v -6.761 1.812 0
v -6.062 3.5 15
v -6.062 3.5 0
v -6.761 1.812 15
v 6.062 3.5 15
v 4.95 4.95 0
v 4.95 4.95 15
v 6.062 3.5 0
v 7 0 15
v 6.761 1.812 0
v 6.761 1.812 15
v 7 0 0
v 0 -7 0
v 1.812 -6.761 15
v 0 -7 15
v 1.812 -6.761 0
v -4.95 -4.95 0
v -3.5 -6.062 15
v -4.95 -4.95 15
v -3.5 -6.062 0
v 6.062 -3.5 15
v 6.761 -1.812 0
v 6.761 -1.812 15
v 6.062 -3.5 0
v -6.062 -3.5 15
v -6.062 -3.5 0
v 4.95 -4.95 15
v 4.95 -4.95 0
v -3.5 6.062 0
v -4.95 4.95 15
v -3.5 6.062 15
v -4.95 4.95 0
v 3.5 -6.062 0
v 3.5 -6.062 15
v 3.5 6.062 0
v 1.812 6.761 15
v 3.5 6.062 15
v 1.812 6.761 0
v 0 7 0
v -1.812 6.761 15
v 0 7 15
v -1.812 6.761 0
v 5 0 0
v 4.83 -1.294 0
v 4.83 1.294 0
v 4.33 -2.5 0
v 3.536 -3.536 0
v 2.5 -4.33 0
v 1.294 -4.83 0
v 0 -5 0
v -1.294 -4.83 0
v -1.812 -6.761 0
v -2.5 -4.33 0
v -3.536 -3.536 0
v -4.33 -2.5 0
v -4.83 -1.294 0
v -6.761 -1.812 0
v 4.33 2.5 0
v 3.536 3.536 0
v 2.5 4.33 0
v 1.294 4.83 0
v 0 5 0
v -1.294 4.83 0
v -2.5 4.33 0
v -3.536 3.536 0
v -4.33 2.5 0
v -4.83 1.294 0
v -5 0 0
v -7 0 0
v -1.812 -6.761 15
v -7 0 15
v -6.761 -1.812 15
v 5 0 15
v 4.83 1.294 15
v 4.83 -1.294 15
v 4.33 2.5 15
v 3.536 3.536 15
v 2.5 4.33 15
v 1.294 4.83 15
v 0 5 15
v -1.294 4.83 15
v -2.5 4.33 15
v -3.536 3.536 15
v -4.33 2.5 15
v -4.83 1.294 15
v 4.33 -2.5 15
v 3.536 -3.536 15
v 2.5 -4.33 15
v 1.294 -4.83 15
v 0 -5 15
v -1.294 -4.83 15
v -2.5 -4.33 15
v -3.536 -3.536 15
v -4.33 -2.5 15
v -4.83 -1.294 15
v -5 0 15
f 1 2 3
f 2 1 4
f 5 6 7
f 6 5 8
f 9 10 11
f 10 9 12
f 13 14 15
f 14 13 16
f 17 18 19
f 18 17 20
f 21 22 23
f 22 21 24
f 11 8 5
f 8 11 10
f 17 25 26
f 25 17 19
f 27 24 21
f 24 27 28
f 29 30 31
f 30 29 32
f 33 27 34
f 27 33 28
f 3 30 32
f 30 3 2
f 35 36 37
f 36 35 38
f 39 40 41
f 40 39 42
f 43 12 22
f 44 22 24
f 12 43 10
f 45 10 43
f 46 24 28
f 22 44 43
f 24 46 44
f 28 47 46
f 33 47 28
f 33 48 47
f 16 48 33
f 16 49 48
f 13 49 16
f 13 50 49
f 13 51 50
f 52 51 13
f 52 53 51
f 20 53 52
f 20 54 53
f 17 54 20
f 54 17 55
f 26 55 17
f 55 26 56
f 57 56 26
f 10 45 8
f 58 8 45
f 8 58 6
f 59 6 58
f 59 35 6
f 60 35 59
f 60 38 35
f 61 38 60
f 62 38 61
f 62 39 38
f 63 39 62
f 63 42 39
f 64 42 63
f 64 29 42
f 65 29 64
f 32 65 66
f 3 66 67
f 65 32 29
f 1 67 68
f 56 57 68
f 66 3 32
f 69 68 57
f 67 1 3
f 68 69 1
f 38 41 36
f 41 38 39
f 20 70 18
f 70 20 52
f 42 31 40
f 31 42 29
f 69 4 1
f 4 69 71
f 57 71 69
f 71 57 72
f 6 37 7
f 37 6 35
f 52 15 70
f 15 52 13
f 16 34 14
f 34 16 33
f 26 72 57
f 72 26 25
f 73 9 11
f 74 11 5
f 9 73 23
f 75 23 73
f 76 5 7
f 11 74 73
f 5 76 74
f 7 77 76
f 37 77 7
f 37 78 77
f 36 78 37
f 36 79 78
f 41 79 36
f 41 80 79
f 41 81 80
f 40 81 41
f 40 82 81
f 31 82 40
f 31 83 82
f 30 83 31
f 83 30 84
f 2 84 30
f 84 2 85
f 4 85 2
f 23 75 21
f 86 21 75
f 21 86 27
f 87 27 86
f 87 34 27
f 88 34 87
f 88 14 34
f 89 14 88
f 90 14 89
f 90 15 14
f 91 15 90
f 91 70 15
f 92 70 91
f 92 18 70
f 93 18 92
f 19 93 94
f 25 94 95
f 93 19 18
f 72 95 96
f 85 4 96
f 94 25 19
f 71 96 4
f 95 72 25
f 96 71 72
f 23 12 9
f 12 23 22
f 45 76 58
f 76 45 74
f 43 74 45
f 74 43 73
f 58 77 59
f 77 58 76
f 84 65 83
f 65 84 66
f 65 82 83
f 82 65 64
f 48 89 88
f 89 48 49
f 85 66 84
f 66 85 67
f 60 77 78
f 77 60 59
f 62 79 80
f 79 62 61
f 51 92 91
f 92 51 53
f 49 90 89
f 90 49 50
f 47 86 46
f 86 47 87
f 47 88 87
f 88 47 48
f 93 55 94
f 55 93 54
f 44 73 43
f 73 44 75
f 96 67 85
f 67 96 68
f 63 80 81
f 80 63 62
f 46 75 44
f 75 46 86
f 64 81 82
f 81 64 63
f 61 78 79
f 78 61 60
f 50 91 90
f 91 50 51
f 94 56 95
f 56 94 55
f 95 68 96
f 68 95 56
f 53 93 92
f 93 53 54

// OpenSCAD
// Generated by scadwright. Do not hand-edit —
// edit the Python source and regenerate.

$fn = 24;

// Tube
//  fn  = 24  (input)
//  h   = 15  (input)
//  id  = 10  (input)
//  thk = 2  (input)
//  od  = id + 2 * thk = 14
difference() {
    cylinder(h=15, r=7, center=false);
    translate([0, 0, -0.01]) {
        scale([1, 1, 1.00133]) {
            cylinder(h=15, r=5, center=false);
        }
    }
}
